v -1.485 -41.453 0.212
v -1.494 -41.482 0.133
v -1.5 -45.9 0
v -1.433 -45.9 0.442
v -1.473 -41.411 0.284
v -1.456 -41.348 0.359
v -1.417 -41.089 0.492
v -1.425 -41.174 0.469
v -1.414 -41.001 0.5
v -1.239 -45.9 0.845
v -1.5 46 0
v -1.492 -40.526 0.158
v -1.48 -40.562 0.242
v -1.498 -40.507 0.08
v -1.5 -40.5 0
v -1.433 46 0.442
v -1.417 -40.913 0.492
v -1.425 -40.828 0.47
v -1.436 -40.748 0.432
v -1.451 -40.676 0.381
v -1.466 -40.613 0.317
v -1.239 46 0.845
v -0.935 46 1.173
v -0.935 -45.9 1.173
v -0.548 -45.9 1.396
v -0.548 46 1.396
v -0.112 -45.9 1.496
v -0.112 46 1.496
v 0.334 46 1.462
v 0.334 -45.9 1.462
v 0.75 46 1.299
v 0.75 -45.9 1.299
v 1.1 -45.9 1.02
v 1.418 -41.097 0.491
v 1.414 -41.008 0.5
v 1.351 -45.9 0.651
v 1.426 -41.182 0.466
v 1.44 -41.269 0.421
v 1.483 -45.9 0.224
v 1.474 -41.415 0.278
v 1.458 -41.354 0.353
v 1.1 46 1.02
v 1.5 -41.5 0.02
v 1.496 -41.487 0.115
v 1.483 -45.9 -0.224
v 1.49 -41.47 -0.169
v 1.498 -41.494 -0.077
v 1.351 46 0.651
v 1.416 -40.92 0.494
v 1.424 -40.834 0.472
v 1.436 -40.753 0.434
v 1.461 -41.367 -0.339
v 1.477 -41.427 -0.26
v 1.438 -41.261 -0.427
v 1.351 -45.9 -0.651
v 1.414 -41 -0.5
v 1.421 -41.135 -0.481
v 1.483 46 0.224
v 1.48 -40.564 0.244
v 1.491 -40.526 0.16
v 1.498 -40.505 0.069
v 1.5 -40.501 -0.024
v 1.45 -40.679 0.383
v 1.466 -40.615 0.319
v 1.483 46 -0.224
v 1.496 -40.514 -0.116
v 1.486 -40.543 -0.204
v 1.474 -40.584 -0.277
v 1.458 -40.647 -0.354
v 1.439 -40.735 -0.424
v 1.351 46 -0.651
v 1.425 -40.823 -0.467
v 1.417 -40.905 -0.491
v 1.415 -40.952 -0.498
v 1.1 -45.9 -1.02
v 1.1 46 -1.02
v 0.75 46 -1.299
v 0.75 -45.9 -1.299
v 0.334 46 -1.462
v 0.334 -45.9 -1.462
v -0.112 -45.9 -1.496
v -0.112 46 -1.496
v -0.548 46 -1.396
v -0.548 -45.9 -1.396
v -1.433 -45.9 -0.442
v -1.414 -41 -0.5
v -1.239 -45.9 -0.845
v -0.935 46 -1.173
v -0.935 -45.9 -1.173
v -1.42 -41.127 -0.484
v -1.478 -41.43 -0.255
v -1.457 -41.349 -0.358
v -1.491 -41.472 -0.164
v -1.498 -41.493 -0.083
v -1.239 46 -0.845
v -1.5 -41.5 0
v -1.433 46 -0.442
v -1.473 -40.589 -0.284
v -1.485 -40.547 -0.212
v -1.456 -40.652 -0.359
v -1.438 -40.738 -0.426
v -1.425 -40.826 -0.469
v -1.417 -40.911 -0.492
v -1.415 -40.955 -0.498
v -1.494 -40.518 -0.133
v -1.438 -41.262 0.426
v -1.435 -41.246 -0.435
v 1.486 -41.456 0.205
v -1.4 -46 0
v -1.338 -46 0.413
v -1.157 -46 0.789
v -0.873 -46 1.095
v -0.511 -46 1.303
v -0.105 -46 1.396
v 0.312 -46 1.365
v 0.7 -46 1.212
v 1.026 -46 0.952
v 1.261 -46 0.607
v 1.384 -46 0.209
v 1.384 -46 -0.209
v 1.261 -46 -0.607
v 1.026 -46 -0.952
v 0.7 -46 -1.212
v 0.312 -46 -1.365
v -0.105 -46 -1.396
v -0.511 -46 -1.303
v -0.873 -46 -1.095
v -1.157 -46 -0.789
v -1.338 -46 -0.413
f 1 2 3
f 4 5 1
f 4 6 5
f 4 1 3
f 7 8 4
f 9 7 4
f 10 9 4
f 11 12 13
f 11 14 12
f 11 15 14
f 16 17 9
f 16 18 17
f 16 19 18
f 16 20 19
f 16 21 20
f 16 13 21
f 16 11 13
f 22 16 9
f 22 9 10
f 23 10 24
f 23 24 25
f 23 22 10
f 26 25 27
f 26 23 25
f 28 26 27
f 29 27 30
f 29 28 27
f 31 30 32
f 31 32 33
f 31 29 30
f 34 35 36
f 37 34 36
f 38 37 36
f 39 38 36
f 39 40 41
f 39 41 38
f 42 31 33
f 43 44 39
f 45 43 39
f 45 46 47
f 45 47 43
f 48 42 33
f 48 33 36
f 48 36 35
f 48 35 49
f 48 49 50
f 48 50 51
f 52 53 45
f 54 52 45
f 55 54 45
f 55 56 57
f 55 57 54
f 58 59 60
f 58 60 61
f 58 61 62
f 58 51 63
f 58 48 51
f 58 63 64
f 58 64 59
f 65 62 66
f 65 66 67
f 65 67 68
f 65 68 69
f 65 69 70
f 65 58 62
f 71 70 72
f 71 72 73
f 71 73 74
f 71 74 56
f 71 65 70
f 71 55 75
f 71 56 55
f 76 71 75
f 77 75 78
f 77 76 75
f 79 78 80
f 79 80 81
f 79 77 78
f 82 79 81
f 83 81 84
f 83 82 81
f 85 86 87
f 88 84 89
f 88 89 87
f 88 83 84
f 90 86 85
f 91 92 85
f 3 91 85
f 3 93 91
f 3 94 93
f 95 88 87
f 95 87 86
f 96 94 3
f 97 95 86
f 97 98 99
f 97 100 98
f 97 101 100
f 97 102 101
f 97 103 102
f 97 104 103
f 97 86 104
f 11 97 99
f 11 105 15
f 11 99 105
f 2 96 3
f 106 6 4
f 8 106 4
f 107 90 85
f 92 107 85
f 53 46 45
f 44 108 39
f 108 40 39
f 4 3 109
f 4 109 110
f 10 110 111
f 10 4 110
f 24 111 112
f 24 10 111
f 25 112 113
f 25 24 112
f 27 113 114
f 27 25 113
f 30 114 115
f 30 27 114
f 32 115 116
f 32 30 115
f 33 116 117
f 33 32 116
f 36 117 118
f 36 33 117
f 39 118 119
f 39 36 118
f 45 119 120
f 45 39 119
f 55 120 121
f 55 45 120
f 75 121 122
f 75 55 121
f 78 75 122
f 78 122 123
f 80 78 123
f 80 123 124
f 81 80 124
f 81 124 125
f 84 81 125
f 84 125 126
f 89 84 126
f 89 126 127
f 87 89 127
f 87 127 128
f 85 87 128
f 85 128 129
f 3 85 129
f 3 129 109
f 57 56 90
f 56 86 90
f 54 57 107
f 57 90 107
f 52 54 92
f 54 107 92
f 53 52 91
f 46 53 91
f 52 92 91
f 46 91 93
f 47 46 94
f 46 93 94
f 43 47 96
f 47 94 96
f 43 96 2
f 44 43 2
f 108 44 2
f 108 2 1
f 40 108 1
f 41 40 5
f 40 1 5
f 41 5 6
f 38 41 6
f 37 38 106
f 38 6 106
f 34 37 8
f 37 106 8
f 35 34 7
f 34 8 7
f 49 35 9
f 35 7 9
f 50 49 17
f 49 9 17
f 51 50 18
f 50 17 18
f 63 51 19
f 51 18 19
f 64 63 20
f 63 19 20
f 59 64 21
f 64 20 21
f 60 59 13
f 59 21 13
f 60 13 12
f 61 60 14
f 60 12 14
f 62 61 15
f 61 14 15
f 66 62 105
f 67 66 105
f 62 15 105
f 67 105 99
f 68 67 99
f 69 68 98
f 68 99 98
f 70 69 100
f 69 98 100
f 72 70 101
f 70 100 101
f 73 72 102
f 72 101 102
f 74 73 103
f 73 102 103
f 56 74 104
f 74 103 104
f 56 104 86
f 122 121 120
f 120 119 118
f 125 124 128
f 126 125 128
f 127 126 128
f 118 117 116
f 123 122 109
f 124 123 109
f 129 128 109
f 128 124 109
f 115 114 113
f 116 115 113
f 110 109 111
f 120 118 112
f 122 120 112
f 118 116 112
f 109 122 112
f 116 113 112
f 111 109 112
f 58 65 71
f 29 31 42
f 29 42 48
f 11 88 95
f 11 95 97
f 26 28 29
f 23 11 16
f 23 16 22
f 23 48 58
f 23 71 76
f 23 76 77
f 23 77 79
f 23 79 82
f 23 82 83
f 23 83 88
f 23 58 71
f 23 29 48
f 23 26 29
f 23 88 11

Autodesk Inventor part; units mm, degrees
ref_plane "YZ Plane" through (0, 0, 0) normal (1, 0, 0) x (0, 1, 0)
ref_plane "XZ Plane" through (0, 0, 0) normal (0, 1, 0) x (-1, 0, 0)
ref_plane "XY Plane" through (0, 0, 0) normal (0, 0, 1) x (1, 0, 0)
sketch "Sketch1" plane through (0, 0, 0) normal (0, 1, 0) x (-1, 0, 0)
  circle A0 centre (0, 0) radius 1.5
  dimension "Diameter" = 3
extrude "Extrusion1" add sketch "Sketch1" along normal mid plane 92
thread "Thread1" size "M3x0.5" class "6g" standard "ANSI Metric M Profile" length 10
chamfer "Chamfer1" distance 0.1 angle 45 1 edges at (1.5, -46, 0)
sketch "Sketch2" plane through (0, 0, 0) normal (1, 0, 0) x (0, 1, 0)
  line L0 (-46, -1.4) -> (-46, 1.4) projected
  point P0 (0, 0)
  point P1 (-41, 0)
  dimension "d8" = 5
hole "Hole1" at (0, -41, 0) direction (-1, 0, 0) diameter 1 end through all both
properties part number "Pendulum Arm" material "Bronze, Soft Tin"
